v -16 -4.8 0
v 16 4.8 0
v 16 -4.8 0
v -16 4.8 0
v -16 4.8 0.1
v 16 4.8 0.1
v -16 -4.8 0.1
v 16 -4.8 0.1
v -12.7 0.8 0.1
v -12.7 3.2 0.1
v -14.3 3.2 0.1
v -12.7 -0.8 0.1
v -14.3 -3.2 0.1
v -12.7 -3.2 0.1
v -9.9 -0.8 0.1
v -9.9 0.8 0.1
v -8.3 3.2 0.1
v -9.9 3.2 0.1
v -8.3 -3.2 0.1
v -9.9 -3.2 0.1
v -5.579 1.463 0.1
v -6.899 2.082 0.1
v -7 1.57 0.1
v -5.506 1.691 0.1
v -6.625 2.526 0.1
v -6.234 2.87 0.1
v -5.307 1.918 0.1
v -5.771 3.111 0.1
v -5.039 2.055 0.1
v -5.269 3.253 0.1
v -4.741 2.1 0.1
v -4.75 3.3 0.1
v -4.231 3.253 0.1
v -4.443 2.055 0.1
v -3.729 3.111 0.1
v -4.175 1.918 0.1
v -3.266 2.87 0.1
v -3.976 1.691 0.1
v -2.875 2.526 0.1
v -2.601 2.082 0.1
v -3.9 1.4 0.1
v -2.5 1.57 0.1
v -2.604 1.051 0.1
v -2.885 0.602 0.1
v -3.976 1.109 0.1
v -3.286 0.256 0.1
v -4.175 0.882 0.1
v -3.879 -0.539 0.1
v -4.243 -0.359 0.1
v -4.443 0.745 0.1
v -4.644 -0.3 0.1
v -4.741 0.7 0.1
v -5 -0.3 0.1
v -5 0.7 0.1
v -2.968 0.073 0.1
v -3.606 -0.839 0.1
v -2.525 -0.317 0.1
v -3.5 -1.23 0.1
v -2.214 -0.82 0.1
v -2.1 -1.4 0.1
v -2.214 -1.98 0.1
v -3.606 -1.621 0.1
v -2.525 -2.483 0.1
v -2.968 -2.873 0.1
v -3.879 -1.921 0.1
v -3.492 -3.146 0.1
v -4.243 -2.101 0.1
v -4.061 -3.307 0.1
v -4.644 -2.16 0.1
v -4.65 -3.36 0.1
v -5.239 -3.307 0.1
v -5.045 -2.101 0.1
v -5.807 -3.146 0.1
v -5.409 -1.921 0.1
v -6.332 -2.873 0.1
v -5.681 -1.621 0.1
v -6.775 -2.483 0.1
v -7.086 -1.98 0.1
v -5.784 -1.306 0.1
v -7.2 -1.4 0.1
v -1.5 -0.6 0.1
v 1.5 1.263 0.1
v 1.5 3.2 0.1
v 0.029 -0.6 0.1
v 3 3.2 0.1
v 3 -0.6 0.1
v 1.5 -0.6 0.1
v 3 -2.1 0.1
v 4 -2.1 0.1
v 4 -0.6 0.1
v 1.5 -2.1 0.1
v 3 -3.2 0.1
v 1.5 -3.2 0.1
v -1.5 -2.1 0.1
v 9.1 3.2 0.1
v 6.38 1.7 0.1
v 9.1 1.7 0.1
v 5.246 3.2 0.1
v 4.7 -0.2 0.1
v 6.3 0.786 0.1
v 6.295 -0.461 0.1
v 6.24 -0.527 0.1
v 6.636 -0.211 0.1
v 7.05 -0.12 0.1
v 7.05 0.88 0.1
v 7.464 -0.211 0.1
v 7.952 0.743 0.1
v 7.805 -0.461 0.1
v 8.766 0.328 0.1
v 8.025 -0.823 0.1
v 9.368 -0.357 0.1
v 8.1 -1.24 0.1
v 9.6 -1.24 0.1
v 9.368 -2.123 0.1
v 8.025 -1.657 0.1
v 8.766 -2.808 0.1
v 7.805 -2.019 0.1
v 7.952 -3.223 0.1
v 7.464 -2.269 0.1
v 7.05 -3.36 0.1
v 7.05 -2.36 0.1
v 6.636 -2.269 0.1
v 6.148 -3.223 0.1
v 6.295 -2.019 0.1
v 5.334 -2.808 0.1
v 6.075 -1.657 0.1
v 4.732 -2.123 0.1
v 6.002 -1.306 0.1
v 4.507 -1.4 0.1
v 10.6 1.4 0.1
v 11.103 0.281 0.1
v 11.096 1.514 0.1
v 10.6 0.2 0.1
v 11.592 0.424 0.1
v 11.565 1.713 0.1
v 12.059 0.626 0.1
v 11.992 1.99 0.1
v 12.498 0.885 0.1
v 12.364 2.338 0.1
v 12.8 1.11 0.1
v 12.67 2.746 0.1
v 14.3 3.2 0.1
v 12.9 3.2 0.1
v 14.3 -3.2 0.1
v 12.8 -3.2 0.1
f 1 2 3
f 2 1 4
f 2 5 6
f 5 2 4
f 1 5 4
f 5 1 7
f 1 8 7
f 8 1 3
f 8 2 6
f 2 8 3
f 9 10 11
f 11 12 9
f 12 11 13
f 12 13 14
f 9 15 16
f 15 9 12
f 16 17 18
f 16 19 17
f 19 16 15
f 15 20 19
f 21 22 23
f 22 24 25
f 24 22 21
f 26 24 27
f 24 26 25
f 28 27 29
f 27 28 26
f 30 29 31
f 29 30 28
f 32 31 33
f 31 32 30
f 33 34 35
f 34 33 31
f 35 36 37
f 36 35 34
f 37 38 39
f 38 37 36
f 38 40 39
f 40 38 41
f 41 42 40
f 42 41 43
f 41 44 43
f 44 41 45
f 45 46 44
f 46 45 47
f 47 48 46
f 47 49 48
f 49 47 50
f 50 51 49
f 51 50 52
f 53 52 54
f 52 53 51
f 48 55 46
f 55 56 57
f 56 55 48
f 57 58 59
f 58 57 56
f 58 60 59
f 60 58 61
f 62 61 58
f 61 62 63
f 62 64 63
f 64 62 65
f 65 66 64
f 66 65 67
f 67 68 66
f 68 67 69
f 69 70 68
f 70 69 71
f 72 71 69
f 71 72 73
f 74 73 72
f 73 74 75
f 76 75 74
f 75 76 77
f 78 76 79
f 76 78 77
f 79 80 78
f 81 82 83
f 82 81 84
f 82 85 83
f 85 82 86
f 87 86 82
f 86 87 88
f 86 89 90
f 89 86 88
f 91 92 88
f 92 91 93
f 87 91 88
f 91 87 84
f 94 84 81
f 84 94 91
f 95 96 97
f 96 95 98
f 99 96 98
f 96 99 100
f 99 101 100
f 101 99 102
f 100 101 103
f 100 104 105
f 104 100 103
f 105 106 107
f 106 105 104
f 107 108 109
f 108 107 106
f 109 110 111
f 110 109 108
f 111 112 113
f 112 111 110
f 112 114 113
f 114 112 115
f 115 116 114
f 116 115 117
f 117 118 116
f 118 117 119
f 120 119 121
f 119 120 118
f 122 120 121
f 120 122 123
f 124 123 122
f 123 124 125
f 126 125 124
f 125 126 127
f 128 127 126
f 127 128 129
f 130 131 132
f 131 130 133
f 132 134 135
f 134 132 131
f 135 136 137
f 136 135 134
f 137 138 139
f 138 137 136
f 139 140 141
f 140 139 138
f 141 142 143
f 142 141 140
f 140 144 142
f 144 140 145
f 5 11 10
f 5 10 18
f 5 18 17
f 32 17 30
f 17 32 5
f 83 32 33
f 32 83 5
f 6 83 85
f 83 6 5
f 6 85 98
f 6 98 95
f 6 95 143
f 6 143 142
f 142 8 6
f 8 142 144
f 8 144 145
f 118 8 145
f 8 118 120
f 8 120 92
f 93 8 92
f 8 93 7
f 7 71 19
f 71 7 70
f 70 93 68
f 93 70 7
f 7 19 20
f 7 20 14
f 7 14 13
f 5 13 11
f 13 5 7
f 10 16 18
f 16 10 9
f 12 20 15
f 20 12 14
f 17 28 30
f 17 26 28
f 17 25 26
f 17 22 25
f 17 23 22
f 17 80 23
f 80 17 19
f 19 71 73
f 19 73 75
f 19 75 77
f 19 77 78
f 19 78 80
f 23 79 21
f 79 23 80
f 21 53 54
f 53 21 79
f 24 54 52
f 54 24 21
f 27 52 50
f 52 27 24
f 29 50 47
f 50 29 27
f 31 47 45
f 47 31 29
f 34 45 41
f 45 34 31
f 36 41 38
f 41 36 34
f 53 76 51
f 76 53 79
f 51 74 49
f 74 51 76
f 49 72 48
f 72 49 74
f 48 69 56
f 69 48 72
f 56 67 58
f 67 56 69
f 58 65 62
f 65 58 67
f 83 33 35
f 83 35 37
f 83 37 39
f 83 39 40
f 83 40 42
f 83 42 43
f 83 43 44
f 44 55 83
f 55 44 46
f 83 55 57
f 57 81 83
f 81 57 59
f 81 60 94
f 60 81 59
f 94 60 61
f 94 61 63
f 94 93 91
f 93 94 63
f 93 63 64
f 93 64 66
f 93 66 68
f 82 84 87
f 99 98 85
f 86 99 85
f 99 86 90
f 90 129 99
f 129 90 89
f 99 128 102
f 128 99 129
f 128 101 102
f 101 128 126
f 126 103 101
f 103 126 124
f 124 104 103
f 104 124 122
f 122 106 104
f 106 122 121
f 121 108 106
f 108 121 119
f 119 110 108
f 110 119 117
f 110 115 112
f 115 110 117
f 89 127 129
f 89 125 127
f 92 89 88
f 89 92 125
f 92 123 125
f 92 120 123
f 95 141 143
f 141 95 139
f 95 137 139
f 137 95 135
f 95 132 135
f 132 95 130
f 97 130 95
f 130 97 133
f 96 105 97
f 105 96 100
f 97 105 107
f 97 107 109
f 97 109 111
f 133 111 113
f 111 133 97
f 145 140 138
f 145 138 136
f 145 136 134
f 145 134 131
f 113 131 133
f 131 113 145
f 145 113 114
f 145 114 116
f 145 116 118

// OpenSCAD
// file: ../p/box5-12.scad
use <../lib.scad>
function ldraw_lib__box5_12() = [
// 0 Box with 5 Faces without Any Edges
// 0 Name: box5-12.dat
// 0 Author: Chris Dee [cwdee]
// 0 !LDRAW_ORG Primitive UPDATE 2009-02
// 0 !LICENSE Licensed under CC BY 2.0 and CC BY 4.0 : see CAreadme.txt
// 
// 0 BFC CERTIFY CCW
  [0,"BFC","CERTIFY"],
  [0,"BFC","CCW"],
// 
// 0 !HISTORY 2009-09-03 [PTadmin] Official Update 2009-02
// 
// 
// 4 16 1 1 1 1 1 -1 -1 1 -1 -1 1 1
  [4,16,1,1,1,1,1,-1,-1,1,-1,-1,1,1],
// 4 16 -1 0 1 1 0 1 1 1 1 -1 1 1
  [4,16,-1,0,1,1,0,1,1,1,1,-1,1,1],
// 4 16 -1 0 -1 -1 0 1 -1 1 1 -1 1 -1
  [4,16,-1,0,-1,-1,0,1,-1,1,1,-1,1,-1],
// 4 16 1 0 -1 -1 0 -1 -1 1 -1 1 1 -1
  [4,16,1,0,-1,-1,0,-1,-1,1,-1,1,1,-1],
// 4 16 1 0 1 1 0 -1 1 1 -1 1 1 1
  [4,16,1,0,1,1,0,-1,1,1,-1,1,1,1],
// 0
];
makepoly(ldraw_lib__box5_12(), line=0.2);
// main file
use <../lib.scad>
use <../p/box5-12.scad>
function ldraw_lib__4162510e() = [
// 0 Sticker  1.2 x  4.0 with Black "H3451" on White Background
// 0 Name: 4162510e.dat
// 0 Author: Massimo Maso [Sirio]
// 0 !LDRAW_ORG Part UPDATE 2022-05
// 0 !LICENSE Licensed under CC BY 2.0 and CC BY 4.0 : see CAreadme.txt
// 
// 0 BFC CERTIFY CCW
  [0,"BFC","CERTIFY"],
  [0,"BFC","CCW"],
// 
// 0 !KEYWORDS Biplane, Camel, Sculptures, Set 3451, Sopwith
// 
// 0 !HISTORY 2022-09-15 [PTadmin] Official Update 2022-05
// 
// 
// 0 // Primitives
// 1 16 0 -.25 0 40 0 0 0 .25 0 0 0 12 box5-12.dat
  [1,16,0,-.25,0,40,0,0,0,.25,0,0,0,12, ldraw_lib__box5_12()],
// 0 // Top faces
// 0 // Letter "H"
// 3 0 -31.75 -.25 2 -31.75 -.25 8 -35.75 -.25 8
  [3,0,-31.75,-.25,2,-31.75,-.25,8,-35.75,-.25,8],
// 4 0 -31.75 -.25 2 -35.75 -.25 8 -35.75 -.25 -8 -31.75 -.25 -2
  [4,0,-31.75,-.25,2,-35.75,-.25,8,-35.75,-.25,-8,-31.75,-.25,-2],
// 3 0 -31.75 -.25 -2 -35.75 -.25 -8 -31.75 -.25 -8
  [3,0,-31.75,-.25,-2,-35.75,-.25,-8,-31.75,-.25,-8],
// 4 0 -31.75 -.25 -2 -24.75 -.25 -2 -24.75 -.25 2 -31.75 -.25 2
  [4,0,-31.75,-.25,-2,-24.75,-.25,-2,-24.75,-.25,2,-31.75,-.25,2],
// 3 0 -24.75 -.25 2 -20.75 -.25 8 -24.75 -.25 8
  [3,0,-24.75,-.25,2,-20.75,-.25,8,-24.75,-.25,8],
// 4 0 -24.75 -.25 2 -24.75 -.25 -2 -20.75 -.25 -8 -20.75 -.25 8
  [4,0,-24.75,-.25,2,-24.75,-.25,-2,-20.75,-.25,-8,-20.75,-.25,8],
// 3 0 -24.75 -.25 -2 -24.75 -.25 -8 -20.75 -.25 -8
  [3,0,-24.75,-.25,-2,-24.75,-.25,-8,-20.75,-.25,-8],
// 0 // Number "3"
// 3 0 -13.9471 -.25 3.6577 -17.2482 -.25 5.2045 -17.5 -.25 3.925
  [3,0,-13.9471,-.25,3.6577,-17.2482,-.25,5.2045,-17.5,-.25,3.925],
// 4 0 -13.9471 -.25 3.6577 -13.7648 -.25 4.2285 -16.5637 -.25 6.3144 -17.2482 -.25 5.2045
  [4,0,-13.9471,-.25,3.6577,-13.7648,-.25,4.2285,-16.5637,-.25,6.3144,-17.2482,-.25,5.2045],
// 4 0 -13.268 -.25 4.7944 -15.5849 -.25 7.176 -16.5637 -.25 6.3144 -13.7648 -.25 4.2285
  [4,0,-13.268,-.25,4.7944,-15.5849,-.25,7.176,-16.5637,-.25,6.3144,-13.7648,-.25,4.2285],
// 4 0 -13.268 -.25 4.7944 -12.5973 -.25 5.1367 -14.4286 -.25 7.7787 -15.5849 -.25 7.176
  [4,0,-13.268,-.25,4.7944,-12.5973,-.25,5.1367,-14.4286,-.25,7.7787,-15.5849,-.25,7.176],
// 4 0 -11.8528 -.25 5.2501 -13.1737 -.25 8.1331 -14.4286 -.25 7.7787 -12.5973 -.25 5.1367
  [4,0,-11.8528,-.25,5.2501,-13.1737,-.25,8.1331,-14.4286,-.25,7.7787,-12.5973,-.25,5.1367],
// 4 0 -11.8528 -.25 5.2501 -10.5763 -.25 8.1331 -11.875 -.25 8.25 -13.1737 -.25 8.1331
  [4,0,-11.8528,-.25,5.2501,-10.5763,-.25,8.1331,-11.875,-.25,8.25,-13.1737,-.25,8.1331],
// 4 0 -11.8528 -.25 5.2501 -11.1084 -.25 5.1367 -9.3214 -.25 7.7787 -10.5763 -.25 8.1331
  [4,0,-11.8528,-.25,5.2501,-11.1084,-.25,5.1367,-9.3214,-.25,7.7787,-10.5763,-.25,8.1331],
// 4 0 -8.1651 -.25 7.176 -9.3214 -.25 7.7787 -11.1084 -.25 5.1367 -10.4376 -.25 4.7944
  [4,0,-8.1651,-.25,7.176,-9.3214,-.25,7.7787,-11.1084,-.25,5.1367,-10.4376,-.25,4.7944],
// 4 0 -8.1651 -.25 7.176 -10.4376 -.25 4.7944 -9.9408 -.25 4.2285 -7.1863 -.25 6.3144
  [4,0,-8.1651,-.25,7.176,-10.4376,-.25,4.7944,-9.9408,-.25,4.2285,-7.1863,-.25,6.3144],
// 4 0 -9.75 -.25 3.5 -6.5018 -.25 5.2045 -7.1863 -.25 6.3144 -9.9408 -.25 4.2285
  [4,0,-9.75,-.25,3.5,-6.5018,-.25,5.2045,-7.1863,-.25,6.3144,-9.9408,-.25,4.2285],
// 4 0 -9.75 -.25 3.5 -6.5094 -.25 2.6267 -6.25 -.25 3.925 -6.5018 -.25 5.2045
  [4,0,-9.75,-.25,3.5,-6.5094,-.25,2.6267,-6.25,-.25,3.925,-6.5018,-.25,5.2045],
// 4 0 -9.75 -.25 3.5 -9.9408 -.25 2.7716 -7.213 -.25 1.5051 -6.5094 -.25 2.6267
  [4,0,-9.75,-.25,3.5,-9.9408,-.25,2.7716,-7.213,-.25,1.5051,-6.5094,-.25,2.6267],
// 4 0 -10.4376 -.25 2.2056 -8.2156 -.25 .6404 -7.213 -.25 1.5051 -9.9408 -.25 2.7716
  [4,0,-10.4376,-.25,2.2056,-8.2156,-.25,.6404,-7.213,-.25,1.5051,-9.9408,-.25,2.7716],
// 3 0 -10.4376 -.25 2.2056 -9.6974 -.25 -1.3463 -8.2156 -.25 .6404
  [3,0,-10.4376,-.25,2.2056,-9.6974,-.25,-1.3463,-8.2156,-.25,.6404],
// 4 0 -10.4376 -.25 2.2056 -11.1084 -.25 1.8633 -10.6066 -.25 -.8977 -9.6974 -.25 -1.3463
  [4,0,-10.4376,-.25,2.2056,-11.1084,-.25,1.8633,-10.6066,-.25,-.8977,-9.6974,-.25,-1.3463],
// 4 0 -11.8528 -.25 1.75 -11.6096 -.25 -.75 -10.6066 -.25 -.8977 -11.1084 -.25 1.8633
  [4,0,-11.8528,-.25,1.75,-11.6096,-.25,-.75,-10.6066,-.25,-.8977,-11.1084,-.25,1.8633],
// 4 0 -11.8528 -.25 1.75 -12.5 -.25 1.75 -12.5 -.25 -.75 -11.6096 -.25 -.75
  [4,0,-11.8528,-.25,1.75,-12.5,-.25,1.75,-12.5,-.25,-.75,-11.6096,-.25,-.75],
// 3 0 -9.6974 -.25 -1.3463 -7.4208 -.25 .1834 -8.2156 -.25 .6404
  [3,0,-9.6974,-.25,-1.3463,-7.4208,-.25,.1834,-8.2156,-.25,.6404],
// 4 0 -9.6974 -.25 -1.3463 -9.0155 -.25 -2.0966 -6.3114 -.25 -.7927 -7.4208 -.25 .1834
  [4,0,-9.6974,-.25,-1.3463,-9.0155,-.25,-2.0966,-6.3114,-.25,-.7927,-7.4208,-.25,.1834],
// 4 0 -8.75 -.25 -3.075 -5.5354 -.25 -2.0502 -6.3114 -.25 -.7927 -9.0155 -.25 -2.0966
  [4,0,-8.75,-.25,-3.075,-5.5354,-.25,-2.0502,-6.3114,-.25,-.7927,-9.0155,-.25,-2.0966],
// 4 0 -8.75 -.25 -3.075 -5.5354 -.25 -4.9498 -5.25 -.25 -3.5 -5.5354 -.25 -2.0502
  [4,0,-8.75,-.25,-3.075,-5.5354,-.25,-4.9498,-5.25,-.25,-3.5,-5.5354,-.25,-2.0502],
// 4 0 -8.75 -.25 -3.075 -9.0155 -.25 -4.0534 -6.3114 -.25 -6.2073 -5.5354 -.25 -4.9498
  [4,0,-8.75,-.25,-3.075,-9.0155,-.25,-4.0534,-6.3114,-.25,-6.2073,-5.5354,-.25,-4.9498],
// 4 0 -9.6974 -.25 -4.8037 -7.4208 -.25 -7.1834 -6.3114 -.25 -6.2073 -9.0155 -.25 -4.0534
  [4,0,-9.6974,-.25,-4.8037,-7.4208,-.25,-7.1834,-6.3114,-.25,-6.2073,-9.0155,-.25,-4.0534],
// 4 0 -9.6974 -.25 -4.8037 -10.6066 -.25 -5.2523 -8.7312 -.25 -7.8661 -7.4208 -.25 -7.1834
  [4,0,-9.6974,-.25,-4.8037,-10.6066,-.25,-5.2523,-8.7312,-.25,-7.8661,-7.4208,-.25,-7.1834],
// 4 0 -11.6096 -.25 -5.4 -10.1533 -.25 -8.2676 -8.7312 -.25 -7.8661 -10.6066 -.25 -5.2523
  [4,0,-11.6096,-.25,-5.4,-10.1533,-.25,-8.2676,-8.7312,-.25,-7.8661,-10.6066,-.25,-5.2523],
// 4 0 -11.6096 -.25 -5.4 -13.0967 -.25 -8.2676 -11.625 -.25 -8.4 -10.1533 -.25 -8.2676
  [4,0,-11.6096,-.25,-5.4,-13.0967,-.25,-8.2676,-11.625,-.25,-8.4,-10.1533,-.25,-8.2676],
// 4 0 -11.6096 -.25 -5.4 -12.6126 -.25 -5.2523 -14.5187 -.25 -7.8661 -13.0967 -.25 -8.2676
  [4,0,-11.6096,-.25,-5.4,-12.6126,-.25,-5.2523,-14.5187,-.25,-7.8661,-13.0967,-.25,-8.2676],
// 4 0 -13.5218 -.25 -4.8037 -15.8292 -.25 -7.1834 -14.5187 -.25 -7.8661 -12.6126 -.25 -5.2523
  [4,0,-13.5218,-.25,-4.8037,-15.8292,-.25,-7.1834,-14.5187,-.25,-7.8661,-12.6126,-.25,-5.2523],
// 4 0 -13.5218 -.25 -4.8037 -14.2036 -.25 -4.0534 -16.9386 -.25 -6.2073 -15.8292 -.25 -7.1834
  [4,0,-13.5218,-.25,-4.8037,-14.2036,-.25,-4.0534,-16.9386,-.25,-6.2073,-15.8292,-.25,-7.1834],
// 4 0 -14.4596 -.25 -3.2645 -17.7146 -.25 -4.9498 -16.9386 -.25 -6.2073 -14.2036 -.25 -4.0534
  [4,0,-14.4596,-.25,-3.2645,-17.7146,-.25,-4.9498,-16.9386,-.25,-6.2073,-14.2036,-.25,-4.0534],
// 3 0 -14.4596 -.25 -3.2645 -18 -.25 -3.5 -17.7146 -.25 -4.9498
  [3,0,-14.4596,-.25,-3.2645,-18,-.25,-3.5,-17.7146,-.25,-4.9498],
// 0 // Number "4"
// 4 0 3.75 -.25 3.1585 3.75 -.25 8 -3.75 -.25 -1.5 .0722 -.25 -1.5
  [4,0,3.75,-.25,3.1585,3.75,-.25,8,-3.75,-.25,-1.5,.0722,-.25,-1.5],
// 4 0 3.75 -.25 3.1585 7.5 -.25 -1.5 7.5 -.25 8 3.75 -.25 8
  [4,0,3.75,-.25,3.1585,7.5,-.25,-1.5,7.5,-.25,8,3.75,-.25,8],
// 4 0 3.75 -.25 3.1585 3.75 -.25 -1.5 7.5 -.25 -5.25 7.5 -.25 -1.5
  [4,0,3.75,-.25,3.1585,3.75,-.25,-1.5,7.5,-.25,-5.25,7.5,-.25,-1.5],
// 4 0 7.5 -.25 -5.25 10 -.25 -5.25 10 -.25 -1.5 7.5 -.25 -1.5
  [4,0,7.5,-.25,-5.25,10,-.25,-5.25,10,-.25,-1.5,7.5,-.25,-1.5],
// 4 0 7.5 -.25 -5.25 3.75 -.25 -5.25 3.75 -.25 -8 7.5 -.25 -8
  [4,0,7.5,-.25,-5.25,3.75,-.25,-5.25,3.75,-.25,-8,7.5,-.25,-8],
// 4 0 3.75 -.25 -5.25 7.5 -.25 -5.25 3.75 -.25 -1.5 .0722 -.25 -1.5
  [4,0,3.75,-.25,-5.25,7.5,-.25,-5.25,3.75,-.25,-1.5,.0722,-.25,-1.5],
// 4 0 3.75 -.25 -5.25 .0722 -.25 -1.5 -3.75 -.25 -1.5 -3.75 -.25 -5.25
  [4,0,3.75,-.25,-5.25,.0722,-.25,-1.5,-3.75,-.25,-1.5,-3.75,-.25,-5.25],
// 0 // Number "5"
// 4 0 13.1152 -.25 8 15.95 -.25 4.25 22.75 -.25 4.25 22.75 -.25 8
  [4,0,13.1152,-.25,8,15.95,-.25,4.25,22.75,-.25,4.25,22.75,-.25,8],
// 4 0 13.1152 -.25 8 11.75 -.25 -.5 15.75 -.25 1.9656 15.95 -.25 4.25
  [4,0,13.1152,-.25,8,11.75,-.25,-.5,15.75,-.25,1.9656,15.95,-.25,4.25],
// 4 0 15.75 -.25 1.9656 11.75 -.25 -.5 15.6008 -.25 -1.3173 15.738 -.25 -1.1535
  [4,0,15.75,-.25,1.9656,11.75,-.25,-.5,15.6008,-.25,-1.3173,15.738,-.25,-1.1535],
// 3 0 15.75 -.25 1.9656 15.738 -.25 -1.1535 16.5909 -.25 -.5264
  [3,0,15.75,-.25,1.9656,15.738,-.25,-1.1535,16.5909,-.25,-.5264],
// 4 0 15.75 -.25 1.9656 16.5909 -.25 -.5264 17.625 -.25 -.3 17.625 -.25 2.2
  [4,0,15.75,-.25,1.9656,16.5909,-.25,-.5264,17.625,-.25,-.3,17.625,-.25,2.2],
// 4 0 19.881 -.25 1.857 17.625 -.25 2.2 17.625 -.25 -.3 18.6591 -.25 -.5264
  [4,0,19.881,-.25,1.857,17.625,-.25,2.2,17.625,-.25,-.3,18.6591,-.25,-.5264],
// 4 0 19.881 -.25 1.857 18.6591 -.25 -.5264 19.512 -.25 -1.1535 21.9142 -.25 .821
  [4,0,19.881,-.25,1.857,18.6591,-.25,-.5264,19.512,-.25,-1.1535,21.9142,-.25,.821],
// 4 0 23.4209 -.25 -.8928 21.9142 -.25 .821 19.512 -.25 -1.1535 20.0616 -.25 -2.0583
  [4,0,23.4209,-.25,-.8928,21.9142,-.25,.821,19.512,-.25,-1.1535,20.0616,-.25,-2.0583],
// 4 0 23.4209 -.25 -.8928 20.0616 -.25 -2.0583 20.25 -.25 -3.1 24 -.25 -3.1
  [4,0,23.4209,-.25,-.8928,20.0616,-.25,-2.0583,20.25,-.25,-3.1,24,-.25,-3.1],
// 4 0 23.4209 -.25 -5.3072 24 -.25 -3.1 20.25 -.25 -3.1 20.0616 -.25 -4.1417
  [4,0,23.4209,-.25,-5.3072,24,-.25,-3.1,20.25,-.25,-3.1,20.0616,-.25,-4.1417],
// 4 0 23.4209 -.25 -5.3072 20.0616 -.25 -4.1417 19.512 -.25 -5.0465 21.9142 -.25 -7.021
  [4,0,23.4209,-.25,-5.3072,20.0616,-.25,-4.1417,19.512,-.25,-5.0465,21.9142,-.25,-7.021],
// 4 0 19.881 -.25 -8.057 21.9142 -.25 -7.021 19.512 -.25 -5.0465 18.6591 -.25 -5.6736
  [4,0,19.881,-.25,-8.057,21.9142,-.25,-7.021,19.512,-.25,-5.0465,18.6591,-.25,-5.6736],
// 4 0 19.881 -.25 -8.057 18.6591 -.25 -5.6736 17.625 -.25 -5.9 17.625 -.25 -8.4
  [4,0,19.881,-.25,-8.057,18.6591,-.25,-5.6736,17.625,-.25,-5.9,17.625,-.25,-8.4],
// 4 0 15.369 -.25 -8.057 17.625 -.25 -8.4 17.625 -.25 -5.9 16.5909 -.25 -5.6736
  [4,0,15.369,-.25,-8.057,17.625,-.25,-8.4,17.625,-.25,-5.9,16.5909,-.25,-5.6736],
// 4 0 15.369 -.25 -8.057 16.5909 -.25 -5.6736 15.738 -.25 -5.0465 13.3358 -.25 -7.021
  [4,0,15.369,-.25,-8.057,16.5909,-.25,-5.6736,15.738,-.25,-5.0465,13.3358,-.25,-7.021],
// 4 0 11.8291 -.25 -5.3072 13.3358 -.25 -7.021 15.738 -.25 -5.0465 15.1884 -.25 -4.1417
  [4,0,11.8291,-.25,-5.3072,13.3358,-.25,-7.021,15.738,-.25,-5.0465,15.1884,-.25,-4.1417],
// 4 0 11.2682 -.25 -3.5 11.8291 -.25 -5.3072 15.1884 -.25 -4.1417 15.0046 -.25 -3.2649
  [4,0,11.2682,-.25,-3.5,11.8291,-.25,-5.3072,15.1884,-.25,-4.1417,15.0046,-.25,-3.2649],
// 0 // Number "1"
// 4 0 27.741 -.25 3.7849 26.5 -.25 3.5 26.5 -.25 .5 27.7571 -.25 .7027
  [4,0,27.741,-.25,3.7849,26.5,-.25,3.5,26.5,-.25,.5,27.7571,-.25,.7027],
// 4 0 27.741 -.25 3.7849 27.7571 -.25 .7027 28.9793 -.25 1.0597 28.9133 -.25 4.2819
  [4,0,27.741,-.25,3.7849,27.7571,-.25,.7027,28.9793,-.25,1.0597,28.9133,-.25,4.2819],
// 4 0 29.9809 -.25 4.9758 28.9133 -.25 4.2819 28.9793 -.25 1.0597 30.1478 -.25 1.5654
  [4,0,29.9809,-.25,4.9758,28.9133,-.25,4.2819,28.9793,-.25,1.0597,30.1478,-.25,1.5654],
// 4 0 29.9809 -.25 4.9758 30.1478 -.25 1.5654 31.2446 -.25 2.2121 30.911 -.25 5.8454
  [4,0,29.9809,-.25,4.9758,30.1478,-.25,1.5654,31.2446,-.25,2.2121,30.911,-.25,5.8454],
// 4 0 31.6752 -.25 6.8638 30.911 -.25 5.8454 31.2446 -.25 2.2121 32 -.25 2.7756
  [4,0,31.6752,-.25,6.8638,30.911,-.25,5.8454,31.2446,-.25,2.2121,32,-.25,2.7756],
// 4 0 31.6752 -.25 6.8638 32 -.25 2.7756 35.75 -.25 8 32.25 -.25 8
  [4,0,31.6752,-.25,6.8638,32,-.25,2.7756,35.75,-.25,8,32.25,-.25,8],
// 4 0 35.75 -.25 8 32 -.25 2.7756 32 -.25 -8 35.75 -.25 -8
  [4,0,35.75,-.25,8,32,-.25,2.7756,32,-.25,-8,35.75,-.25,-8],
// 0 // White faces
// 3 15 -40 -.25 12 -35.75 -.25 8 -31.75 -.25 8
  [3,15,-40,-.25,12,-35.75,-.25,8,-31.75,-.25,8],
// 3 15 -40 -.25 12 -31.75 -.25 8 -24.75 -.25 8
  [3,15,-40,-.25,12,-31.75,-.25,8,-24.75,-.25,8],
// 3 15 -40 -.25 12 -24.75 -.25 8 -20.75 -.25 8
  [3,15,-40,-.25,12,-24.75,-.25,8,-20.75,-.25,8],
// 4 15 -40 -.25 12 -20.75 -.25 8 -13.1737 -.25 8.1331 -11.875 -.25 8.25
  [4,15,-40,-.25,12,-20.75,-.25,8,-13.1737,-.25,8.1331,-11.875,-.25,8.25],
// 4 15 -40 -.25 12 -11.875 -.25 8.25 -10.5763 -.25 8.1331 3.75 -.25 8
  [4,15,-40,-.25,12,-11.875,-.25,8.25,-10.5763,-.25,8.1331,3.75,-.25,8],
// 4 15 -40 -.25 12 3.75 -.25 8 7.5 -.25 8 40 -.25 12
  [4,15,-40,-.25,12,3.75,-.25,8,7.5,-.25,8,40,-.25,12],
// 3 15 40 -.25 12 7.5 -.25 8 13.1152 -.25 8
  [3,15,40,-.25,12,7.5,-.25,8,13.1152,-.25,8],
// 3 15 40 -.25 12 13.1152 -.25 8 22.75 -.25 8
  [3,15,40,-.25,12,13.1152,-.25,8,22.75,-.25,8],
// 3 15 40 -.25 12 22.75 -.25 8 32.25 -.25 8
  [3,15,40,-.25,12,22.75,-.25,8,32.25,-.25,8],
// 3 15 40 -.25 12 32.25 -.25 8 35.75 -.25 8
  [3,15,40,-.25,12,32.25,-.25,8,35.75,-.25,8],
// 4 15 40 -.25 12 35.75 -.25 8 35.75 -.25 -8 40 -.25 -12
  [4,15,40,-.25,12,35.75,-.25,8,35.75,-.25,-8,40,-.25,-12],
// 3 15 40 -.25 -12 35.75 -.25 -8 32 -.25 -8
  [3,15,40,-.25,-12,35.75,-.25,-8,32,-.25,-8],
// 4 15 40 -.25 -12 32 -.25 -8 19.881 -.25 -8.057 17.625 -.25 -8.4
  [4,15,40,-.25,-12,32,-.25,-8,19.881,-.25,-8.057,17.625,-.25,-8.4],
// 3 15 40 -.25 -12 17.625 -.25 -8.4 7.5 -.25 -8
  [3,15,40,-.25,-12,17.625,-.25,-8.4,7.5,-.25,-8],
// 4 15 40 -.25 -12 7.5 -.25 -8 3.75 -.25 -8 -40 -.25 -12
  [4,15,40,-.25,-12,7.5,-.25,-8,3.75,-.25,-8,-40,-.25,-12],
// 4 15 -40 -.25 -12 -11.625 -.25 -8.4 -13.0967 -.25 -8.2676 -20.75 -.25 -8
  [4,15,-40,-.25,-12,-11.625,-.25,-8.4,-13.0967,-.25,-8.2676,-20.75,-.25,-8],
// 4 15 -40 -.25 -12 3.75 -.25 -8 -10.1533 -.25 -8.2676 -11.625 -.25 -8.4
  [4,15,-40,-.25,-12,3.75,-.25,-8,-10.1533,-.25,-8.2676,-11.625,-.25,-8.4],
// 3 15 -40 -.25 -12 -20.75 -.25 -8 -24.75 -.25 -8
  [3,15,-40,-.25,-12,-20.75,-.25,-8,-24.75,-.25,-8],
// 3 15 -40 -.25 -12 -24.75 -.25 -8 -31.75 -.25 -8
  [3,15,-40,-.25,-12,-24.75,-.25,-8,-31.75,-.25,-8],
// 3 15 -40 -.25 -12 -31.75 -.25 -8 -35.75 -.25 -8
  [3,15,-40,-.25,-12,-31.75,-.25,-8,-35.75,-.25,-8],
// 4 15 -40 -.25 -12 -35.75 -.25 -8 -35.75 -.25 8 -40 -.25 12
  [4,15,-40,-.25,-12,-35.75,-.25,-8,-35.75,-.25,8,-40,-.25,12],
// 4 15 -31.75 -.25 2 -24.75 -.25 2 -24.75 -.25 8 -31.75 -.25 8
  [4,15,-31.75,-.25,2,-24.75,-.25,2,-24.75,-.25,8,-31.75,-.25,8],
// 4 15 -24.75 -.25 -2 -31.75 -.25 -2 -31.75 -.25 -8 -24.75 -.25 -8
  [4,15,-24.75,-.25,-2,-31.75,-.25,-2,-31.75,-.25,-8,-24.75,-.25,-8],
// 3 15 -20.75 -.25 8 -14.4286 -.25 7.7787 -13.1737 -.25 8.1331
  [3,15,-20.75,-.25,8,-14.4286,-.25,7.7787,-13.1737,-.25,8.1331],
// 3 15 -20.75 -.25 8 -15.5849 -.25 7.176 -14.4286 -.25 7.7787
  [3,15,-20.75,-.25,8,-15.5849,-.25,7.176,-14.4286,-.25,7.7787],
// 3 15 -20.75 -.25 8 -16.5637 -.25 6.3144 -15.5849 -.25 7.176
  [3,15,-20.75,-.25,8,-16.5637,-.25,6.3144,-15.5849,-.25,7.176],
// 3 15 -20.75 -.25 8 -17.2482 -.25 5.2045 -16.5637 -.25 6.3144
  [3,15,-20.75,-.25,8,-17.2482,-.25,5.2045,-16.5637,-.25,6.3144],
// 3 15 -20.75 -.25 8 -17.5 -.25 3.925 -17.2482 -.25 5.2045
  [3,15,-20.75,-.25,8,-17.5,-.25,3.925,-17.2482,-.25,5.2045],
// 4 15 -20.75 -.25 8 -20.75 -.25 -8 -18 -.25 -3.5 -17.5 -.25 3.925
  [4,15,-20.75,-.25,8,-20.75,-.25,-8,-18,-.25,-3.5,-17.5,-.25,3.925],
// 3 15 -20.75 -.25 -8 -13.0967 -.25 -8.2676 -14.5187 -.25 -7.8661
  [3,15,-20.75,-.25,-8,-13.0967,-.25,-8.2676,-14.5187,-.25,-7.8661],
// 3 15 -20.75 -.25 -8 -14.5187 -.25 -7.8661 -15.8292 -.25 -7.1834
  [3,15,-20.75,-.25,-8,-14.5187,-.25,-7.8661,-15.8292,-.25,-7.1834],
// 3 15 -20.75 -.25 -8 -15.8292 -.25 -7.1834 -16.9386 -.25 -6.2073
  [3,15,-20.75,-.25,-8,-15.8292,-.25,-7.1834,-16.9386,-.25,-6.2073],
// 3 15 -20.75 -.25 -8 -16.9386 -.25 -6.2073 -17.7146 -.25 -4.9498
  [3,15,-20.75,-.25,-8,-16.9386,-.25,-6.2073,-17.7146,-.25,-4.9498],
// 3 15 -20.75 -.25 -8 -17.7146 -.25 -4.9498 -18 -.25 -3.5
  [3,15,-20.75,-.25,-8,-17.7146,-.25,-4.9498,-18,-.25,-3.5],
// 4 15 -13.9471 -.25 3.6577 -17.5 -.25 3.925 -18 -.25 -3.5 -14.4596 -.25 -3.2645
  [4,15,-13.9471,-.25,3.6577,-17.5,-.25,3.925,-18,-.25,-3.5,-14.4596,-.25,-3.2645],
// 4 15 -13.9471 -.25 3.6577 -14.4596 -.25 -3.2645 -12.5 -.25 -.75 -12.5 -.25 1.75
  [4,15,-13.9471,-.25,3.6577,-14.4596,-.25,-3.2645,-12.5,-.25,-.75,-12.5,-.25,1.75],
// 4 15 -13.7648 -.25 4.2285 -13.9471 -.25 3.6577 -12.5 -.25 1.75 -11.8528 -.25 1.75
  [4,15,-13.7648,-.25,4.2285,-13.9471,-.25,3.6577,-12.5,-.25,1.75,-11.8528,-.25,1.75],
// 4 15 -13.7648 -.25 4.2285 -11.8528 -.25 1.75 -11.1084 -.25 1.8633 -13.268 -.25 4.7944
  [4,15,-13.7648,-.25,4.2285,-11.8528,-.25,1.75,-11.1084,-.25,1.8633,-13.268,-.25,4.7944],
// 4 15 -12.5973 -.25 5.1367 -13.268 -.25 4.7944 -11.1084 -.25 1.8633 -10.4376 -.25 2.2056
  [4,15,-12.5973,-.25,5.1367,-13.268,-.25,4.7944,-11.1084,-.25,1.8633,-10.4376,-.25,2.2056],
// 4 15 -12.5973 -.25 5.1367 -10.4376 -.25 2.2056 -9.9408 -.25 2.7716 -11.8528 -.25 5.2501
  [4,15,-12.5973,-.25,5.1367,-10.4376,-.25,2.2056,-9.9408,-.25,2.7716,-11.8528,-.25,5.2501],
// 4 15 -11.1084 -.25 5.1367 -11.8528 -.25 5.2501 -9.9408 -.25 2.7716 -9.75 -.25 3.5
  [4,15,-11.1084,-.25,5.1367,-11.8528,-.25,5.2501,-9.9408,-.25,2.7716,-9.75,-.25,3.5],
// 4 15 -11.1084 -.25 5.1367 -9.75 -.25 3.5 -9.9408 -.25 4.2285 -10.4376 -.25 4.7944
  [4,15,-11.1084,-.25,5.1367,-9.75,-.25,3.5,-9.9408,-.25,4.2285,-10.4376,-.25,4.7944],
// 4 15 -14.2036 -.25 -4.0534 -11.6096 -.25 -.75 -12.5 -.25 -.75 -14.4596 -.25 -3.2645
  [4,15,-14.2036,-.25,-4.0534,-11.6096,-.25,-.75,-12.5,-.25,-.75,-14.4596,-.25,-3.2645],
// 4 15 -14.2036 -.25 -4.0534 -13.5218 -.25 -4.8037 -10.6066 -.25 -.8977 -11.6096 -.25 -.75
  [4,15,-14.2036,-.25,-4.0534,-13.5218,-.25,-4.8037,-10.6066,-.25,-.8977,-11.6096,-.25,-.75],
// 4 15 -12.6126 -.25 -5.2523 -9.6974 -.25 -1.3463 -10.6066 -.25 -.8977 -13.5218 -.25 -4.8037
  [4,15,-12.6126,-.25,-5.2523,-9.6974,-.25,-1.3463,-10.6066,-.25,-.8977,-13.5218,-.25,-4.8037],
// 4 15 -12.6126 -.25 -5.2523 -11.6096 -.25 -5.4 -9.0155 -.25 -2.0966 -9.6974 -.25 -1.3463
  [4,15,-12.6126,-.25,-5.2523,-11.6096,-.25,-5.4,-9.0155,-.25,-2.0966,-9.6974,-.25,-1.3463],
// 4 15 -10.6066 -.25 -5.2523 -8.75 -.25 -3.075 -9.0155 -.25 -2.0966 -11.6096 -.25 -5.4
  [4,15,-10.6066,-.25,-5.2523,-8.75,-.25,-3.075,-9.0155,-.25,-2.0966,-11.6096,-.25,-5.4],
// 4 15 -10.6066 -.25 -5.2523 -9.6974 -.25 -4.8037 -9.0155 -.25 -4.0534 -8.75 -.25 -3.075
  [4,15,-10.6066,-.25,-5.2523,-9.6974,-.25,-4.8037,-9.0155,-.25,-4.0534,-8.75,-.25,-3.075],
// 3 15 3.75 -.25 8 -10.5763 -.25 8.1331 -9.3214 -.25 7.7787
  [3,15,3.75,-.25,8,-10.5763,-.25,8.1331,-9.3214,-.25,7.7787],
// 3 15 3.75 -.25 8 -9.3214 -.25 7.7787 -8.1651 -.25 7.176
  [3,15,3.75,-.25,8,-9.3214,-.25,7.7787,-8.1651,-.25,7.176],
// 3 15 3.75 -.25 8 -8.1651 -.25 7.176 -7.1863 -.25 6.3144
  [3,15,3.75,-.25,8,-8.1651,-.25,7.176,-7.1863,-.25,6.3144],
// 3 15 3.75 -.25 8 -7.1863 -.25 6.3144 -6.5018 -.25 5.2045
  [3,15,3.75,-.25,8,-7.1863,-.25,6.3144,-6.5018,-.25,5.2045],
// 3 15 3.75 -.25 8 -6.5018 -.25 5.2045 -6.25 -.25 3.925
  [3,15,3.75,-.25,8,-6.5018,-.25,5.2045,-6.25,-.25,3.925],
// 3 15 3.75 -.25 8 -6.25 -.25 3.925 -6.5094 -.25 2.6267
  [3,15,3.75,-.25,8,-6.25,-.25,3.925,-6.5094,-.25,2.6267],
// 3 15 3.75 -.25 8 -6.5094 -.25 2.6267 -7.213 -.25 1.5051
  [3,15,3.75,-.25,8,-6.5094,-.25,2.6267,-7.213,-.25,1.5051],
// 4 15 3.75 -.25 8 -7.213 -.25 1.5051 -8.2156 -.25 .6404 -7.4208 -.25 .1834
  [4,15,3.75,-.25,8,-7.213,-.25,1.5051,-8.2156,-.25,.6404,-7.4208,-.25,.1834],
// 3 15 3.75 -.25 8 -7.4208 -.25 .1834 -6.3114 -.25 -.7927
  [3,15,3.75,-.25,8,-7.4208,-.25,.1834,-6.3114,-.25,-.7927],
// 4 15 3.75 -.25 8 -6.3114 -.25 -.7927 -5.5354 -.25 -2.0502 -3.75 -.25 -1.5
  [4,15,3.75,-.25,8,-6.3114,-.25,-.7927,-5.5354,-.25,-2.0502,-3.75,-.25,-1.5],
// 4 15 -3.75 -.25 -5.25 -3.75 -.25 -1.5 -5.5354 -.25 -2.0502 -5.25 -.25 -3.5
  [4,15,-3.75,-.25,-5.25,-3.75,-.25,-1.5,-5.5354,-.25,-2.0502,-5.25,-.25,-3.5],
// 3 15 -3.75 -.25 -5.25 -5.25 -.25 -3.5 -5.5354 -.25 -4.9498
  [3,15,-3.75,-.25,-5.25,-5.25,-.25,-3.5,-5.5354,-.25,-4.9498],
// 3 15 -3.75 -.25 -5.25 -5.5354 -.25 -4.9498 -6.3114 -.25 -6.2073
  [3,15,-3.75,-.25,-5.25,-5.5354,-.25,-4.9498,-6.3114,-.25,-6.2073],
// 4 15 -3.75 -.25 -5.25 -6.3114 -.25 -6.2073 3.75 -.25 -8 3.75 -.25 -5.25
  [4,15,-3.75,-.25,-5.25,-6.3114,-.25,-6.2073,3.75,-.25,-8,3.75,-.25,-5.25],
// 3 15 3.75 -.25 -8 -6.3114 -.25 -6.2073 -7.4208 -.25 -7.1834
  [3,15,3.75,-.25,-8,-6.3114,-.25,-6.2073,-7.4208,-.25,-7.1834],
// 3 15 3.75 -.25 -8 -7.4208 -.25 -7.1834 -8.7312 -.25 -7.8661
  [3,15,3.75,-.25,-8,-7.4208,-.25,-7.1834,-8.7312,-.25,-7.8661],
// 3 15 3.75 -.25 -8 -8.7312 -.25 -7.8661 -10.1533 -.25 -8.2676
  [3,15,3.75,-.25,-8,-8.7312,-.25,-7.8661,-10.1533,-.25,-8.2676],
// 3 15 3.75 -.25 3.1585 .0722 -.25 -1.5 3.75 -.25 -1.5
  [3,15,3.75,-.25,3.1585,.0722,-.25,-1.5,3.75,-.25,-1.5],
// 3 15 11.75 -.25 -.5 13.1152 -.25 8 7.5 -.25 8
  [3,15,11.75,-.25,-.5,13.1152,-.25,8,7.5,-.25,8],
// 4 15 11.75 -.25 -.5 7.5 -.25 8 7.5 -.25 -1.5 10 -.25 -1.5
  [4,15,11.75,-.25,-.5,7.5,-.25,8,7.5,-.25,-1.5,10,-.25,-1.5],
// 4 15 11.75 -.25 -.5 10 -.25 -1.5 10 -.25 -5.25 11.2682 -.25 -3.5
  [4,15,11.75,-.25,-.5,10,-.25,-1.5,10,-.25,-5.25,11.2682,-.25,-3.5],
// 4 15 11.75 -.25 -.5 11.2682 -.25 -3.5 15.0046 -.25 -3.2649 15.6008 -.25 -1.3173
  [4,15,11.75,-.25,-.5,11.2682,-.25,-3.5,15.0046,-.25,-3.2649,15.6008,-.25,-1.3173],
// 4 15 15.738 -.25 -1.1535 15.6008 -.25 -1.3173 15.0046 -.25 -3.2649 15.1884 -.25 -4.1417
  [4,15,15.738,-.25,-1.1535,15.6008,-.25,-1.3173,15.0046,-.25,-3.2649,15.1884,-.25,-4.1417],
// 4 15 15.738 -.25 -1.1535 15.1884 -.25 -4.1417 15.738 -.25 -5.0465 16.5909 -.25 -.5264
  [4,15,15.738,-.25,-1.1535,15.1884,-.25,-4.1417,15.738,-.25,-5.0465,16.5909,-.25,-.5264],
// 4 15 17.625 -.25 -.3 16.5909 -.25 -.5264 15.738 -.25 -5.0465 16.5909 -.25 -5.6736
  [4,15,17.625,-.25,-.3,16.5909,-.25,-.5264,15.738,-.25,-5.0465,16.5909,-.25,-5.6736],
// 4 15 17.625 -.25 -.3 16.5909 -.25 -5.6736 17.625 -.25 -5.9 18.6591 -.25 -.5264
  [4,15,17.625,-.25,-.3,16.5909,-.25,-5.6736,17.625,-.25,-5.9,18.6591,-.25,-.5264],
// 4 15 19.512 -.25 -1.1535 18.6591 -.25 -.5264 17.625 -.25 -5.9 18.6591 -.25 -5.6736
  [4,15,19.512,-.25,-1.1535,18.6591,-.25,-.5264,17.625,-.25,-5.9,18.6591,-.25,-5.6736],
// 4 15 19.512 -.25 -1.1535 18.6591 -.25 -5.6736 19.512 -.25 -5.0465 20.0616 -.25 -2.0583
  [4,15,19.512,-.25,-1.1535,18.6591,-.25,-5.6736,19.512,-.25,-5.0465,20.0616,-.25,-2.0583],
// 4 15 20.0616 -.25 -2.0583 19.512 -.25 -5.0465 20.0616 -.25 -4.1417 20.25 -.25 -3.1
  [4,15,20.0616,-.25,-2.0583,19.512,-.25,-5.0465,20.0616,-.25,-4.1417,20.25,-.25,-3.1],
// 3 15 10 -.25 -5.25 11.8291 -.25 -5.3072 11.2682 -.25 -3.5
  [3,15,10,-.25,-5.25,11.8291,-.25,-5.3072,11.2682,-.25,-3.5],
// 3 15 10 -.25 -5.25 13.3358 -.25 -7.021 11.8291 -.25 -5.3072
  [3,15,10,-.25,-5.25,13.3358,-.25,-7.021,11.8291,-.25,-5.3072],
// 4 15 10 -.25 -5.25 7.5 -.25 -5.25 7.5 -.25 -8 13.3358 -.25 -7.021
  [4,15,10,-.25,-5.25,7.5,-.25,-5.25,7.5,-.25,-8,13.3358,-.25,-7.021],
// 3 15 7.5 -.25 -8 15.369 -.25 -8.057 13.3358 -.25 -7.021
  [3,15,7.5,-.25,-8,15.369,-.25,-8.057,13.3358,-.25,-7.021],
// 3 15 7.5 -.25 -8 17.625 -.25 -8.4 15.369 -.25 -8.057
  [3,15,7.5,-.25,-8,17.625,-.25,-8.4,15.369,-.25,-8.057],
// 4 15 22.75 -.25 8 30.911 -.25 5.8454 31.6752 -.25 6.8638 32.25 -.25 8
  [4,15,22.75,-.25,8,30.911,-.25,5.8454,31.6752,-.25,6.8638,32.25,-.25,8],
// 4 15 22.75 -.25 8 28.9133 -.25 4.2819 29.9809 -.25 4.9758 30.911 -.25 5.8454
  [4,15,22.75,-.25,8,28.9133,-.25,4.2819,29.9809,-.25,4.9758,30.911,-.25,5.8454],
// 4 15 22.75 -.25 8 26.5 -.25 3.5 27.741 -.25 3.7849 28.9133 -.25 4.2819
  [4,15,22.75,-.25,8,26.5,-.25,3.5,27.741,-.25,3.7849,28.9133,-.25,4.2819],
// 4 15 22.75 -.25 8 22.75 -.25 4.25 26.5 -.25 .5 26.5 -.25 3.5
  [4,15,22.75,-.25,8,22.75,-.25,4.25,26.5,-.25,.5,26.5,-.25,3.5],
// 4 15 22.75 -.25 4.25 15.95 -.25 4.25 15.75 -.25 1.9656 17.625 -.25 2.2
  [4,15,22.75,-.25,4.25,15.95,-.25,4.25,15.75,-.25,1.9656,17.625,-.25,2.2],
// 3 15 22.75 -.25 4.25 17.625 -.25 2.2 19.881 -.25 1.857
  [3,15,22.75,-.25,4.25,17.625,-.25,2.2,19.881,-.25,1.857],
// 3 15 22.75 -.25 4.25 19.881 -.25 1.857 21.9142 -.25 .821
  [3,15,22.75,-.25,4.25,19.881,-.25,1.857,21.9142,-.25,.821],
// 3 15 22.75 -.25 4.25 21.9142 -.25 .821 23.4209 -.25 -.8928
  [3,15,22.75,-.25,4.25,21.9142,-.25,.821,23.4209,-.25,-.8928],
// 4 15 22.75 -.25 4.25 23.4209 -.25 -.8928 24 -.25 -3.1 26.5 -.25 .5
  [4,15,22.75,-.25,4.25,23.4209,-.25,-.8928,24,-.25,-3.1,26.5,-.25,.5],
// 3 15 32 -.25 -8 32 -.25 2.7756 31.2446 -.25 2.2121
  [3,15,32,-.25,-8,32,-.25,2.7756,31.2446,-.25,2.2121],
// 3 15 32 -.25 -8 31.2446 -.25 2.2121 30.1478 -.25 1.5654
  [3,15,32,-.25,-8,31.2446,-.25,2.2121,30.1478,-.25,1.5654],
// 3 15 32 -.25 -8 30.1478 -.25 1.5654 28.9793 -.25 1.0597
  [3,15,32,-.25,-8,30.1478,-.25,1.5654,28.9793,-.25,1.0597],
// 3 15 32 -.25 -8 28.9793 -.25 1.0597 27.7571 -.25 .7027
  [3,15,32,-.25,-8,28.9793,-.25,1.0597,27.7571,-.25,.7027],
// 4 15 32 -.25 -8 27.7571 -.25 .7027 26.5 -.25 .5 24 -.25 -3.1
  [4,15,32,-.25,-8,27.7571,-.25,.7027,26.5,-.25,.5,24,-.25,-3.1],
// 3 15 32 -.25 -8 24 -.25 -3.1 23.4209 -.25 -5.3072
  [3,15,32,-.25,-8,24,-.25,-3.1,23.4209,-.25,-5.3072],
// 3 15 32 -.25 -8 23.4209 -.25 -5.3072 21.9142 -.25 -7.021
  [3,15,32,-.25,-8,23.4209,-.25,-5.3072,21.9142,-.25,-7.021],
// 3 15 32 -.25 -8 21.9142 -.25 -7.021 19.881 -.25 -8.057
  [3,15,32,-.25,-8,21.9142,-.25,-7.021,19.881,-.25,-8.057],
];
makepoly(ldraw_lib__4162510e(), line=0.2);
